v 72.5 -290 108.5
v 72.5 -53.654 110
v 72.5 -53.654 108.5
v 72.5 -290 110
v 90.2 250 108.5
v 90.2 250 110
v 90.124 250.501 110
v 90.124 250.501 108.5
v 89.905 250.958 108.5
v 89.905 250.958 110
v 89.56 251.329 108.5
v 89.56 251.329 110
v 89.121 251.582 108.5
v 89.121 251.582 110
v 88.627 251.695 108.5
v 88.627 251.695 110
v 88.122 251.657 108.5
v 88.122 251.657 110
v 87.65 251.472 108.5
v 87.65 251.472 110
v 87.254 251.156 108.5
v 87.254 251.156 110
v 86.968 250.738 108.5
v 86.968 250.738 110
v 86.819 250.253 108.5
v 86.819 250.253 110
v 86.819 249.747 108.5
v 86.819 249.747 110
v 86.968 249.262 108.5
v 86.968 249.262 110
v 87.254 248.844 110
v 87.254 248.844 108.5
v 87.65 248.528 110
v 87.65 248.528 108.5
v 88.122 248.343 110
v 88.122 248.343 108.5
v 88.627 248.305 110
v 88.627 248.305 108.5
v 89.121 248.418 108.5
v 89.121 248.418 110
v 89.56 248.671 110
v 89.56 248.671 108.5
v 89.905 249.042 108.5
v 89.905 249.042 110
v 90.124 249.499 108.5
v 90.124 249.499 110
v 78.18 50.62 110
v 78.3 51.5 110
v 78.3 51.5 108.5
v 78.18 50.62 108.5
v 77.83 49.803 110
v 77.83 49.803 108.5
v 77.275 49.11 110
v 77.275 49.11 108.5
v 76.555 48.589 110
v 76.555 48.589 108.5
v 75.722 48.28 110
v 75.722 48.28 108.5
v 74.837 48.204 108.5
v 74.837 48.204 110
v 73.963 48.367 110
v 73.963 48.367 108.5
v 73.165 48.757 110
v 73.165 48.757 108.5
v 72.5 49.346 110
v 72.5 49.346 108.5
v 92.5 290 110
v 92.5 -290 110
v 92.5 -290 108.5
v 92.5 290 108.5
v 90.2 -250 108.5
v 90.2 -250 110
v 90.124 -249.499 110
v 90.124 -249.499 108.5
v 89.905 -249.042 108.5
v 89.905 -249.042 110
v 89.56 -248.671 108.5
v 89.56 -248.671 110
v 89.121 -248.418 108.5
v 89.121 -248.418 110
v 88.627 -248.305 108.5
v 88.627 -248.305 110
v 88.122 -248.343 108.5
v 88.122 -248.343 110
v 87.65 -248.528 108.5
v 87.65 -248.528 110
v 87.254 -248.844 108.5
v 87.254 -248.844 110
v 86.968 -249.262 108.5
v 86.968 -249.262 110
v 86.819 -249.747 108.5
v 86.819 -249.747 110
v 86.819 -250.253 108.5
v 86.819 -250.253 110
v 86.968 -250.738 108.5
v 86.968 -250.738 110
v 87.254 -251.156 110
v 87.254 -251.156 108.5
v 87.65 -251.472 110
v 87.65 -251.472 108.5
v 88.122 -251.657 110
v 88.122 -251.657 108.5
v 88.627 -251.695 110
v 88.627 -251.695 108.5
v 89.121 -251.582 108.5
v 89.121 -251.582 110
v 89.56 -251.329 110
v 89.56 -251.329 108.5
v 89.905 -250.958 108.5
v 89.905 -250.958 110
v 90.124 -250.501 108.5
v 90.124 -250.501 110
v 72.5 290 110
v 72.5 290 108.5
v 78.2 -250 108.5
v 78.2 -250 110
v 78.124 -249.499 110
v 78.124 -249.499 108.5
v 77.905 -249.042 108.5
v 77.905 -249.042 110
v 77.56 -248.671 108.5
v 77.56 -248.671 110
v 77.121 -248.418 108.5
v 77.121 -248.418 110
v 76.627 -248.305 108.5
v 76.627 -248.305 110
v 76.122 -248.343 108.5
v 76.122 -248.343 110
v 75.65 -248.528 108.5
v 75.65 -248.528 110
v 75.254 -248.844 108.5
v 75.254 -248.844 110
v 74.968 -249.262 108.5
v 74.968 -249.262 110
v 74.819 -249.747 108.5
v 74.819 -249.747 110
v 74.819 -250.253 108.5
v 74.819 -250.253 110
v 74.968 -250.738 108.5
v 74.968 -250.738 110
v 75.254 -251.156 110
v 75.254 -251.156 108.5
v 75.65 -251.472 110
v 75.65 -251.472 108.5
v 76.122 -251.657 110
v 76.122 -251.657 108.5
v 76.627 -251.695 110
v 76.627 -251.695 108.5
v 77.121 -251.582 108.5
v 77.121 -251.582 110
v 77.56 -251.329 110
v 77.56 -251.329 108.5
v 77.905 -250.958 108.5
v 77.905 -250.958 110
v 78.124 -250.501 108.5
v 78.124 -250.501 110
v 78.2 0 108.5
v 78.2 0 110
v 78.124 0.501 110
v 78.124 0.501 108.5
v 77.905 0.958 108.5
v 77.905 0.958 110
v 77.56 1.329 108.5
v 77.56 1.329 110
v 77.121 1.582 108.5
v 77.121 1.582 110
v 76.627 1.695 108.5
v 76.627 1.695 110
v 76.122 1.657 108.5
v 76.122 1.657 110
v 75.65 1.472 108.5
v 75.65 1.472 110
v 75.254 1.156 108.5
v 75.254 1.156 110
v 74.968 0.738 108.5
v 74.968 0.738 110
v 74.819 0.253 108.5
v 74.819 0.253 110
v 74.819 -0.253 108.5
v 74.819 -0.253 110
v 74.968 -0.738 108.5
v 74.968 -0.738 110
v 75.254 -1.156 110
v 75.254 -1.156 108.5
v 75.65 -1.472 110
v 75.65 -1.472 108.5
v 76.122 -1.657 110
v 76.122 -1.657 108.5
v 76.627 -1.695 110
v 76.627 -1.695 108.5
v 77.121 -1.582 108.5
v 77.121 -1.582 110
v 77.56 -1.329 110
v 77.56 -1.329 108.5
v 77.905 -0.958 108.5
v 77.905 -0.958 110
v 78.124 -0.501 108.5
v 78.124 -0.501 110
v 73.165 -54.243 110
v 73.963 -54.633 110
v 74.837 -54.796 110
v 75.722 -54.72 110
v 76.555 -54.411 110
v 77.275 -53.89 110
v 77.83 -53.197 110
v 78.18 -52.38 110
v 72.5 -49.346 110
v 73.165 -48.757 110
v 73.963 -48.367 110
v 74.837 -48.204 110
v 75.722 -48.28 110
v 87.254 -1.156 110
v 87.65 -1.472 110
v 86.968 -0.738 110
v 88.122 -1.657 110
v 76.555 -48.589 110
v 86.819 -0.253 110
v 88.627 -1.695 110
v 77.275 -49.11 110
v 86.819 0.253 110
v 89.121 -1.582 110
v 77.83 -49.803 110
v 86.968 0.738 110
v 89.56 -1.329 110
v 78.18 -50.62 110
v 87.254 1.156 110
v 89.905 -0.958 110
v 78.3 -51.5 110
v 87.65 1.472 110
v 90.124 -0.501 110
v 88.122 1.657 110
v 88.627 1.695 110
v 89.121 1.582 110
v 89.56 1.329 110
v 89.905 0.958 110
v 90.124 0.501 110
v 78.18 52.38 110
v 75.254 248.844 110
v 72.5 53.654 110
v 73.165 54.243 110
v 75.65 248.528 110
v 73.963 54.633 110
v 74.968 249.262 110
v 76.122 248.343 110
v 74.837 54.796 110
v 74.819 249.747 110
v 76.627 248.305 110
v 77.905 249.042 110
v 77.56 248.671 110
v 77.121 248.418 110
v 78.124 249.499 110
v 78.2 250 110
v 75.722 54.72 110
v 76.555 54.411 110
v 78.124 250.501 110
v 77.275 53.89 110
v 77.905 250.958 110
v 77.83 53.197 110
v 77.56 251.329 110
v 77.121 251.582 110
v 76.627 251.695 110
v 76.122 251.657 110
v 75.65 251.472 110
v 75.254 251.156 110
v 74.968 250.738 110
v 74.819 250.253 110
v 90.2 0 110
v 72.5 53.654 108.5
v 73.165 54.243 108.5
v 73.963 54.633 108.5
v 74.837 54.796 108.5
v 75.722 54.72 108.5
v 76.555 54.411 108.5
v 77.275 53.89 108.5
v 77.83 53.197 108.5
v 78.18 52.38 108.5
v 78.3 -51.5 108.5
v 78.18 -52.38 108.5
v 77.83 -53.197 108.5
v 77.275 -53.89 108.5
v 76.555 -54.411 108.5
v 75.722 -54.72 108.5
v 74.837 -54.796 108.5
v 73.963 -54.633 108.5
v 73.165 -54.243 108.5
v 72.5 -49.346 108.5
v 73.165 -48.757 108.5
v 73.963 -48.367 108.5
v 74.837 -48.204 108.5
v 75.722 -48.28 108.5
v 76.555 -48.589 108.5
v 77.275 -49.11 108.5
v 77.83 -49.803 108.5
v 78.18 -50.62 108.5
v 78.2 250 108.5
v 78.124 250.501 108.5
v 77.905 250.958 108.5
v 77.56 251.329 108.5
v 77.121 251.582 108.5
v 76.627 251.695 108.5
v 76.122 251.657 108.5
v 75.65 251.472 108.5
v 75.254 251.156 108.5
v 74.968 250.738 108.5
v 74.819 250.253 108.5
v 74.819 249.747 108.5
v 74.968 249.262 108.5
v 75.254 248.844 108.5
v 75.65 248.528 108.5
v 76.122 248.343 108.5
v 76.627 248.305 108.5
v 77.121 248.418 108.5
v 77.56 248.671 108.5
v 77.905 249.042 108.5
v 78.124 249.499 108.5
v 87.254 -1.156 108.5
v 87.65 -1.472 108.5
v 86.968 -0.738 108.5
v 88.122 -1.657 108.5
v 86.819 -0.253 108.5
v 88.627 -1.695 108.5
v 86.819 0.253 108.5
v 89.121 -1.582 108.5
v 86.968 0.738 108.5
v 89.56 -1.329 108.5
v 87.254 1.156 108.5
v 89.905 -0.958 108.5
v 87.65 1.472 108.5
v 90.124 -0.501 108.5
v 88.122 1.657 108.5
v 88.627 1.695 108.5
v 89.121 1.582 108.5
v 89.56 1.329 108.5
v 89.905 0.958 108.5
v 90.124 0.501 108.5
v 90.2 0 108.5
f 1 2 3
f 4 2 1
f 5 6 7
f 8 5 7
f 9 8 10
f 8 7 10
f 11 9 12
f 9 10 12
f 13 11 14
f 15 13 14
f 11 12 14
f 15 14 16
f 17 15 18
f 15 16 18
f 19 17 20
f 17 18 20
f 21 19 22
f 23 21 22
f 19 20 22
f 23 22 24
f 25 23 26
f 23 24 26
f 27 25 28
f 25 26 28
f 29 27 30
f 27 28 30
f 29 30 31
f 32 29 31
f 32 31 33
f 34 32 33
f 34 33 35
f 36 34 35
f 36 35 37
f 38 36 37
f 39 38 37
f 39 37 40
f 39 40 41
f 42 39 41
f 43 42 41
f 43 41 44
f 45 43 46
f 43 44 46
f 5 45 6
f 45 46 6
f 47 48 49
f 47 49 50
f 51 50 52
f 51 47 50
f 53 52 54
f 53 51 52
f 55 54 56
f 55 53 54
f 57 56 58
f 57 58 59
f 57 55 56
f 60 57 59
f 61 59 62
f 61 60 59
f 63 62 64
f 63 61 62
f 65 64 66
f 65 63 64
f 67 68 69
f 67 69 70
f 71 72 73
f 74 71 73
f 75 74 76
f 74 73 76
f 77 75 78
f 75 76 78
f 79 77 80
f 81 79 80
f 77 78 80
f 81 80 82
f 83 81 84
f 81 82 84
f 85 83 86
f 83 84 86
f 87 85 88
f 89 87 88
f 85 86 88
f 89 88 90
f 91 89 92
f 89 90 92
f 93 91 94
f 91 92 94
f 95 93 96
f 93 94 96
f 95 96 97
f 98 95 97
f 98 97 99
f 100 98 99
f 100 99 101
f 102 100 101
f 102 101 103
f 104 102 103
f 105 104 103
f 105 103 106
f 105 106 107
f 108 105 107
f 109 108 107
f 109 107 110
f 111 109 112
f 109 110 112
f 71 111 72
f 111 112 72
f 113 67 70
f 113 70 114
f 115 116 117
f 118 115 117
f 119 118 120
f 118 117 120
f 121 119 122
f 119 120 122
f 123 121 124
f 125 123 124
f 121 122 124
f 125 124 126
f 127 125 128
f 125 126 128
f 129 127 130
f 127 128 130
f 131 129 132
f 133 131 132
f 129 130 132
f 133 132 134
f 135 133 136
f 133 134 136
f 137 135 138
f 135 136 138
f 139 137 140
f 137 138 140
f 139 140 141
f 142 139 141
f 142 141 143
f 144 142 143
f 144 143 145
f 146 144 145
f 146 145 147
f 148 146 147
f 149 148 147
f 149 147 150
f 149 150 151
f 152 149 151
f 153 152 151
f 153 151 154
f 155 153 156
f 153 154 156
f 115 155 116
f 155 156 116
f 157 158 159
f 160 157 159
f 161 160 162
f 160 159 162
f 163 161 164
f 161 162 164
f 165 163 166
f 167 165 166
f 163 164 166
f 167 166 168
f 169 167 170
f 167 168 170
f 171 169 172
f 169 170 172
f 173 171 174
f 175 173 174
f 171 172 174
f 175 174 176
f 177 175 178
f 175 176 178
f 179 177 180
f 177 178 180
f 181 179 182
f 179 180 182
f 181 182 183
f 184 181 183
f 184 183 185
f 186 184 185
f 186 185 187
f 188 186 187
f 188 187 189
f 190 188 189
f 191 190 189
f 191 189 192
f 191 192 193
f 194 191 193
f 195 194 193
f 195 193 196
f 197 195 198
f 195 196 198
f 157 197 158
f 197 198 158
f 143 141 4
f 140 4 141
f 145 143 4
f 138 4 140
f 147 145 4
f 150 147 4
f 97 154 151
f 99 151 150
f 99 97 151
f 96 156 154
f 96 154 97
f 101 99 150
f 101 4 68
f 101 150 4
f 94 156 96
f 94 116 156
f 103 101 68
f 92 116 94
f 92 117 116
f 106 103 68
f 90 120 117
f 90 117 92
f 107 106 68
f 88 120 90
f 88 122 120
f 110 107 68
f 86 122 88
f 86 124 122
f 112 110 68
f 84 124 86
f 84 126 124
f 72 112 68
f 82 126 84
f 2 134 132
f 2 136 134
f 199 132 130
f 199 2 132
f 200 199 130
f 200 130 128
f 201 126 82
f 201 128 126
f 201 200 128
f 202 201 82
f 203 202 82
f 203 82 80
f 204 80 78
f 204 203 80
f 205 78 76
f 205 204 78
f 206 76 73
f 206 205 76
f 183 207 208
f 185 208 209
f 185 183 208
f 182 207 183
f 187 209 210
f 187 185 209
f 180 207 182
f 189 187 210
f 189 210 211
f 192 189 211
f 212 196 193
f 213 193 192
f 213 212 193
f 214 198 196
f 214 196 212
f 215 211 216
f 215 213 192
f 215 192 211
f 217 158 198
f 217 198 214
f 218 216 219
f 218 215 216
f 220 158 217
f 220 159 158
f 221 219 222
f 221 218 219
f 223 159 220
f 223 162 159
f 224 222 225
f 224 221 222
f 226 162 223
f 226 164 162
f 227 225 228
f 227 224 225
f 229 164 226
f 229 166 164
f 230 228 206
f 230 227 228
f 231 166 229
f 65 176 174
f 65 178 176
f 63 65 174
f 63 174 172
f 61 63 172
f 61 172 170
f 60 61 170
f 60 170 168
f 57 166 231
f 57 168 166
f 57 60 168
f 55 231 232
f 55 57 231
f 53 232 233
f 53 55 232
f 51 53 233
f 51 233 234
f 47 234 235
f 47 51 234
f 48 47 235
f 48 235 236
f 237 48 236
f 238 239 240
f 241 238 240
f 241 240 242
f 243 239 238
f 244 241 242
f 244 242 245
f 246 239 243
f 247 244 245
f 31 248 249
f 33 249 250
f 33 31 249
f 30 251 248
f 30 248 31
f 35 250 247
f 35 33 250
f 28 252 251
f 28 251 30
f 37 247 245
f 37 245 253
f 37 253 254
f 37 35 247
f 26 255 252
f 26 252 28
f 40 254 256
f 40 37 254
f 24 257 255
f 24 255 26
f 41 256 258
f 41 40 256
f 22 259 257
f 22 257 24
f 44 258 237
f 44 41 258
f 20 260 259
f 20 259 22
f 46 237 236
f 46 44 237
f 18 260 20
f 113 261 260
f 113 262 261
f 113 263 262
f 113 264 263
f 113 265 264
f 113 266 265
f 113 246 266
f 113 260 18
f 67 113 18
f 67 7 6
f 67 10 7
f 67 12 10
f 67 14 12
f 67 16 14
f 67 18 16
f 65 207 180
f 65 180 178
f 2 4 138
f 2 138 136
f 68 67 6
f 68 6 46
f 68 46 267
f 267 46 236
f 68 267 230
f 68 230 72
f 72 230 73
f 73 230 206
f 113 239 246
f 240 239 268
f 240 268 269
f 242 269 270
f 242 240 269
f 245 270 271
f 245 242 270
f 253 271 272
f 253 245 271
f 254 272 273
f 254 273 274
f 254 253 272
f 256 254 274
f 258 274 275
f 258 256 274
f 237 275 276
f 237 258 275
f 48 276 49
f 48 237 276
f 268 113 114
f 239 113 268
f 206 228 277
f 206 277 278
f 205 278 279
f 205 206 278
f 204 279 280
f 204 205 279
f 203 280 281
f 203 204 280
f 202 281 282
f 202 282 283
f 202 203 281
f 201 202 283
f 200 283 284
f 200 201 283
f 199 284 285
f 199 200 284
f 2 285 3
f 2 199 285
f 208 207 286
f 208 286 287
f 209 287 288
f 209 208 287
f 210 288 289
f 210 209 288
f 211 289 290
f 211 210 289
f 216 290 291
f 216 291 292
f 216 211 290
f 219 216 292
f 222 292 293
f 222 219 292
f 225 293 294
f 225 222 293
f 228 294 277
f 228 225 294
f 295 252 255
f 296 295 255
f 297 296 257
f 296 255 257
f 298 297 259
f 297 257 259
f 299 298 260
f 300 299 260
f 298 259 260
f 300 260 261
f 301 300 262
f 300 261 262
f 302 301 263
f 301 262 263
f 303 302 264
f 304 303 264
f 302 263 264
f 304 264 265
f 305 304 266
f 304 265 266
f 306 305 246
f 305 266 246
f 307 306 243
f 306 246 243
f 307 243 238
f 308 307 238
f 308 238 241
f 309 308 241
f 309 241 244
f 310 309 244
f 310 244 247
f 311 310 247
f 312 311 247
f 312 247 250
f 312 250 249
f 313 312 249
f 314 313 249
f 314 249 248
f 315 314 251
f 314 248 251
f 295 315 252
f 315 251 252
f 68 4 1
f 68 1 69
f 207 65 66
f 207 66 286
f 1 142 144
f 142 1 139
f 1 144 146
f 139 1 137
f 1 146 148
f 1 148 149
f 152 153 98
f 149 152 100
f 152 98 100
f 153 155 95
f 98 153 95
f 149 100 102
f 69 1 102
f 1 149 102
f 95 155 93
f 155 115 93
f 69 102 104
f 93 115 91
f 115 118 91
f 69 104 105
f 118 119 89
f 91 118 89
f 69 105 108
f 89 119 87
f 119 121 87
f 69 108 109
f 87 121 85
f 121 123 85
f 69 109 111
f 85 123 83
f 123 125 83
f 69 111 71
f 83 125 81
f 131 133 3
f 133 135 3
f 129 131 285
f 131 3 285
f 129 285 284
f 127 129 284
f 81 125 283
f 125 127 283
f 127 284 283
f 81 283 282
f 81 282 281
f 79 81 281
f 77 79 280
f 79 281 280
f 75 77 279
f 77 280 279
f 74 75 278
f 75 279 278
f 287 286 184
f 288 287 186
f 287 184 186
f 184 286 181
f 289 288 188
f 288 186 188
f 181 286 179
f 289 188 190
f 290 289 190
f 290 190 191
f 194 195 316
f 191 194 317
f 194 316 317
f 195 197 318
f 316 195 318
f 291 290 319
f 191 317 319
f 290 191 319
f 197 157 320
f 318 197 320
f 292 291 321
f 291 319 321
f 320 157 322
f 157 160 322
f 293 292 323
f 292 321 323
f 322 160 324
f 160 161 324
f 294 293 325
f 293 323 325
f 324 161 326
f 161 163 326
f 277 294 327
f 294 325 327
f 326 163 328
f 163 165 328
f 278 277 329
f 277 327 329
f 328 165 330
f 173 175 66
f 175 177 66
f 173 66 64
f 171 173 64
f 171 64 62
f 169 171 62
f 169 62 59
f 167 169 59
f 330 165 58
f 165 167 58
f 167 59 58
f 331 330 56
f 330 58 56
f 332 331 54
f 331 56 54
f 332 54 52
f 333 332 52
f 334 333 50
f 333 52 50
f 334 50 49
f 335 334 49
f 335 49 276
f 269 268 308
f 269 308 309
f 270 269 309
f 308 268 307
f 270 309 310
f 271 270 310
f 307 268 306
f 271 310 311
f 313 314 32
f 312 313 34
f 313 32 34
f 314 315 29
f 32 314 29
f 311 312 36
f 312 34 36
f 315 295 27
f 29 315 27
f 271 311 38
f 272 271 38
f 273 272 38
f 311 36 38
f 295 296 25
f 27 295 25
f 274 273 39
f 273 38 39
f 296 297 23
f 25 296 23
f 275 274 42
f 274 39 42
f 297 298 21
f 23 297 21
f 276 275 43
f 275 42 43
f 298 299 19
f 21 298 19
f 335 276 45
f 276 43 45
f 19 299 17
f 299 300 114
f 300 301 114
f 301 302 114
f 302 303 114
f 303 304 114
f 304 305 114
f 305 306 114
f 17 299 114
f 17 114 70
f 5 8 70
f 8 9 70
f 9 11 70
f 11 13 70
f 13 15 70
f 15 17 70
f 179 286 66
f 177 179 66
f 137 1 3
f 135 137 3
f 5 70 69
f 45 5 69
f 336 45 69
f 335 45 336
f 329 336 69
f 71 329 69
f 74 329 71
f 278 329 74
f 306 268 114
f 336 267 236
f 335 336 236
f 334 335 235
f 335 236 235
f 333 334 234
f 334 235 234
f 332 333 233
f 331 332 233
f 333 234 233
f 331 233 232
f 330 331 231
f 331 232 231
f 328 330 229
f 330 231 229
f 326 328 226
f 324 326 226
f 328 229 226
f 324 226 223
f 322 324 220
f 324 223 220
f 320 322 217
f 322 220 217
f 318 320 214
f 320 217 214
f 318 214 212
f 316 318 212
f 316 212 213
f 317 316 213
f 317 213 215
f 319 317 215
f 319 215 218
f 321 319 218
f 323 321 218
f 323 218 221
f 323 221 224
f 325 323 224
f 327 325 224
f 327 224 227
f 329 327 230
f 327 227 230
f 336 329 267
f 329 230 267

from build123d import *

# Parameters (mm, degrees)
MAIN_PROFILE_SKETCH_R = 1.7
MAIN_EXTRUSION_DEPTH  = 1.5


with BuildPart() as part:
    # Main Profile Sketch → Main Extrusion (new body)
    with BuildSketch(Plane.XY.offset(110)):
        with BuildLine():
            Line((72.5, 49.345934077), (72.5, -49.345934077))
            ThreePointArc((72.5, -49.345934077), (76.148912529, -48.40645834), (78.3, -51.5))
            ThreePointArc((78.3, -51.5), (76.148912529, -54.59354166), (72.5, -53.654065923))
            Line((72.5, -53.654065923), (72.5, -290))
            Line((72.5, -290), (92.5, -290))
            Line((92.5, -290), (92.5, 290))
            Line((92.5, 290), (72.5, 290))
            Line((72.5, 290), (72.5, 53.654065923))
            ThreePointArc((72.5, 53.654065923), (76.148912529, 54.59354166), (78.3, 51.5))
            ThreePointArc((78.3, 51.5), (76.148912529, 48.40645834), (72.5, 49.345934077))
        make_face()
        with Locations((76.5, -250)):
            Circle(MAIN_PROFILE_SKETCH_R, mode=Mode.SUBTRACT)
        with Locations((88.5, -250)):
            Circle(MAIN_PROFILE_SKETCH_R, mode=Mode.SUBTRACT)
        with Locations((76.5, 0)):
            Circle(MAIN_PROFILE_SKETCH_R, mode=Mode.SUBTRACT)
        with Locations((76.5, 250)):
            Circle(MAIN_PROFILE_SKETCH_R, mode=Mode.SUBTRACT)
        with Locations((88.5, 0)):
            Circle(MAIN_PROFILE_SKETCH_R, mode=Mode.SUBTRACT)
        with Locations((88.5, 250)):
            Circle(MAIN_PROFILE_SKETCH_R, mode=Mode.SUBTRACT)
    extrude(amount=-MAIN_EXTRUSION_DEPTH)


solid = part.part
